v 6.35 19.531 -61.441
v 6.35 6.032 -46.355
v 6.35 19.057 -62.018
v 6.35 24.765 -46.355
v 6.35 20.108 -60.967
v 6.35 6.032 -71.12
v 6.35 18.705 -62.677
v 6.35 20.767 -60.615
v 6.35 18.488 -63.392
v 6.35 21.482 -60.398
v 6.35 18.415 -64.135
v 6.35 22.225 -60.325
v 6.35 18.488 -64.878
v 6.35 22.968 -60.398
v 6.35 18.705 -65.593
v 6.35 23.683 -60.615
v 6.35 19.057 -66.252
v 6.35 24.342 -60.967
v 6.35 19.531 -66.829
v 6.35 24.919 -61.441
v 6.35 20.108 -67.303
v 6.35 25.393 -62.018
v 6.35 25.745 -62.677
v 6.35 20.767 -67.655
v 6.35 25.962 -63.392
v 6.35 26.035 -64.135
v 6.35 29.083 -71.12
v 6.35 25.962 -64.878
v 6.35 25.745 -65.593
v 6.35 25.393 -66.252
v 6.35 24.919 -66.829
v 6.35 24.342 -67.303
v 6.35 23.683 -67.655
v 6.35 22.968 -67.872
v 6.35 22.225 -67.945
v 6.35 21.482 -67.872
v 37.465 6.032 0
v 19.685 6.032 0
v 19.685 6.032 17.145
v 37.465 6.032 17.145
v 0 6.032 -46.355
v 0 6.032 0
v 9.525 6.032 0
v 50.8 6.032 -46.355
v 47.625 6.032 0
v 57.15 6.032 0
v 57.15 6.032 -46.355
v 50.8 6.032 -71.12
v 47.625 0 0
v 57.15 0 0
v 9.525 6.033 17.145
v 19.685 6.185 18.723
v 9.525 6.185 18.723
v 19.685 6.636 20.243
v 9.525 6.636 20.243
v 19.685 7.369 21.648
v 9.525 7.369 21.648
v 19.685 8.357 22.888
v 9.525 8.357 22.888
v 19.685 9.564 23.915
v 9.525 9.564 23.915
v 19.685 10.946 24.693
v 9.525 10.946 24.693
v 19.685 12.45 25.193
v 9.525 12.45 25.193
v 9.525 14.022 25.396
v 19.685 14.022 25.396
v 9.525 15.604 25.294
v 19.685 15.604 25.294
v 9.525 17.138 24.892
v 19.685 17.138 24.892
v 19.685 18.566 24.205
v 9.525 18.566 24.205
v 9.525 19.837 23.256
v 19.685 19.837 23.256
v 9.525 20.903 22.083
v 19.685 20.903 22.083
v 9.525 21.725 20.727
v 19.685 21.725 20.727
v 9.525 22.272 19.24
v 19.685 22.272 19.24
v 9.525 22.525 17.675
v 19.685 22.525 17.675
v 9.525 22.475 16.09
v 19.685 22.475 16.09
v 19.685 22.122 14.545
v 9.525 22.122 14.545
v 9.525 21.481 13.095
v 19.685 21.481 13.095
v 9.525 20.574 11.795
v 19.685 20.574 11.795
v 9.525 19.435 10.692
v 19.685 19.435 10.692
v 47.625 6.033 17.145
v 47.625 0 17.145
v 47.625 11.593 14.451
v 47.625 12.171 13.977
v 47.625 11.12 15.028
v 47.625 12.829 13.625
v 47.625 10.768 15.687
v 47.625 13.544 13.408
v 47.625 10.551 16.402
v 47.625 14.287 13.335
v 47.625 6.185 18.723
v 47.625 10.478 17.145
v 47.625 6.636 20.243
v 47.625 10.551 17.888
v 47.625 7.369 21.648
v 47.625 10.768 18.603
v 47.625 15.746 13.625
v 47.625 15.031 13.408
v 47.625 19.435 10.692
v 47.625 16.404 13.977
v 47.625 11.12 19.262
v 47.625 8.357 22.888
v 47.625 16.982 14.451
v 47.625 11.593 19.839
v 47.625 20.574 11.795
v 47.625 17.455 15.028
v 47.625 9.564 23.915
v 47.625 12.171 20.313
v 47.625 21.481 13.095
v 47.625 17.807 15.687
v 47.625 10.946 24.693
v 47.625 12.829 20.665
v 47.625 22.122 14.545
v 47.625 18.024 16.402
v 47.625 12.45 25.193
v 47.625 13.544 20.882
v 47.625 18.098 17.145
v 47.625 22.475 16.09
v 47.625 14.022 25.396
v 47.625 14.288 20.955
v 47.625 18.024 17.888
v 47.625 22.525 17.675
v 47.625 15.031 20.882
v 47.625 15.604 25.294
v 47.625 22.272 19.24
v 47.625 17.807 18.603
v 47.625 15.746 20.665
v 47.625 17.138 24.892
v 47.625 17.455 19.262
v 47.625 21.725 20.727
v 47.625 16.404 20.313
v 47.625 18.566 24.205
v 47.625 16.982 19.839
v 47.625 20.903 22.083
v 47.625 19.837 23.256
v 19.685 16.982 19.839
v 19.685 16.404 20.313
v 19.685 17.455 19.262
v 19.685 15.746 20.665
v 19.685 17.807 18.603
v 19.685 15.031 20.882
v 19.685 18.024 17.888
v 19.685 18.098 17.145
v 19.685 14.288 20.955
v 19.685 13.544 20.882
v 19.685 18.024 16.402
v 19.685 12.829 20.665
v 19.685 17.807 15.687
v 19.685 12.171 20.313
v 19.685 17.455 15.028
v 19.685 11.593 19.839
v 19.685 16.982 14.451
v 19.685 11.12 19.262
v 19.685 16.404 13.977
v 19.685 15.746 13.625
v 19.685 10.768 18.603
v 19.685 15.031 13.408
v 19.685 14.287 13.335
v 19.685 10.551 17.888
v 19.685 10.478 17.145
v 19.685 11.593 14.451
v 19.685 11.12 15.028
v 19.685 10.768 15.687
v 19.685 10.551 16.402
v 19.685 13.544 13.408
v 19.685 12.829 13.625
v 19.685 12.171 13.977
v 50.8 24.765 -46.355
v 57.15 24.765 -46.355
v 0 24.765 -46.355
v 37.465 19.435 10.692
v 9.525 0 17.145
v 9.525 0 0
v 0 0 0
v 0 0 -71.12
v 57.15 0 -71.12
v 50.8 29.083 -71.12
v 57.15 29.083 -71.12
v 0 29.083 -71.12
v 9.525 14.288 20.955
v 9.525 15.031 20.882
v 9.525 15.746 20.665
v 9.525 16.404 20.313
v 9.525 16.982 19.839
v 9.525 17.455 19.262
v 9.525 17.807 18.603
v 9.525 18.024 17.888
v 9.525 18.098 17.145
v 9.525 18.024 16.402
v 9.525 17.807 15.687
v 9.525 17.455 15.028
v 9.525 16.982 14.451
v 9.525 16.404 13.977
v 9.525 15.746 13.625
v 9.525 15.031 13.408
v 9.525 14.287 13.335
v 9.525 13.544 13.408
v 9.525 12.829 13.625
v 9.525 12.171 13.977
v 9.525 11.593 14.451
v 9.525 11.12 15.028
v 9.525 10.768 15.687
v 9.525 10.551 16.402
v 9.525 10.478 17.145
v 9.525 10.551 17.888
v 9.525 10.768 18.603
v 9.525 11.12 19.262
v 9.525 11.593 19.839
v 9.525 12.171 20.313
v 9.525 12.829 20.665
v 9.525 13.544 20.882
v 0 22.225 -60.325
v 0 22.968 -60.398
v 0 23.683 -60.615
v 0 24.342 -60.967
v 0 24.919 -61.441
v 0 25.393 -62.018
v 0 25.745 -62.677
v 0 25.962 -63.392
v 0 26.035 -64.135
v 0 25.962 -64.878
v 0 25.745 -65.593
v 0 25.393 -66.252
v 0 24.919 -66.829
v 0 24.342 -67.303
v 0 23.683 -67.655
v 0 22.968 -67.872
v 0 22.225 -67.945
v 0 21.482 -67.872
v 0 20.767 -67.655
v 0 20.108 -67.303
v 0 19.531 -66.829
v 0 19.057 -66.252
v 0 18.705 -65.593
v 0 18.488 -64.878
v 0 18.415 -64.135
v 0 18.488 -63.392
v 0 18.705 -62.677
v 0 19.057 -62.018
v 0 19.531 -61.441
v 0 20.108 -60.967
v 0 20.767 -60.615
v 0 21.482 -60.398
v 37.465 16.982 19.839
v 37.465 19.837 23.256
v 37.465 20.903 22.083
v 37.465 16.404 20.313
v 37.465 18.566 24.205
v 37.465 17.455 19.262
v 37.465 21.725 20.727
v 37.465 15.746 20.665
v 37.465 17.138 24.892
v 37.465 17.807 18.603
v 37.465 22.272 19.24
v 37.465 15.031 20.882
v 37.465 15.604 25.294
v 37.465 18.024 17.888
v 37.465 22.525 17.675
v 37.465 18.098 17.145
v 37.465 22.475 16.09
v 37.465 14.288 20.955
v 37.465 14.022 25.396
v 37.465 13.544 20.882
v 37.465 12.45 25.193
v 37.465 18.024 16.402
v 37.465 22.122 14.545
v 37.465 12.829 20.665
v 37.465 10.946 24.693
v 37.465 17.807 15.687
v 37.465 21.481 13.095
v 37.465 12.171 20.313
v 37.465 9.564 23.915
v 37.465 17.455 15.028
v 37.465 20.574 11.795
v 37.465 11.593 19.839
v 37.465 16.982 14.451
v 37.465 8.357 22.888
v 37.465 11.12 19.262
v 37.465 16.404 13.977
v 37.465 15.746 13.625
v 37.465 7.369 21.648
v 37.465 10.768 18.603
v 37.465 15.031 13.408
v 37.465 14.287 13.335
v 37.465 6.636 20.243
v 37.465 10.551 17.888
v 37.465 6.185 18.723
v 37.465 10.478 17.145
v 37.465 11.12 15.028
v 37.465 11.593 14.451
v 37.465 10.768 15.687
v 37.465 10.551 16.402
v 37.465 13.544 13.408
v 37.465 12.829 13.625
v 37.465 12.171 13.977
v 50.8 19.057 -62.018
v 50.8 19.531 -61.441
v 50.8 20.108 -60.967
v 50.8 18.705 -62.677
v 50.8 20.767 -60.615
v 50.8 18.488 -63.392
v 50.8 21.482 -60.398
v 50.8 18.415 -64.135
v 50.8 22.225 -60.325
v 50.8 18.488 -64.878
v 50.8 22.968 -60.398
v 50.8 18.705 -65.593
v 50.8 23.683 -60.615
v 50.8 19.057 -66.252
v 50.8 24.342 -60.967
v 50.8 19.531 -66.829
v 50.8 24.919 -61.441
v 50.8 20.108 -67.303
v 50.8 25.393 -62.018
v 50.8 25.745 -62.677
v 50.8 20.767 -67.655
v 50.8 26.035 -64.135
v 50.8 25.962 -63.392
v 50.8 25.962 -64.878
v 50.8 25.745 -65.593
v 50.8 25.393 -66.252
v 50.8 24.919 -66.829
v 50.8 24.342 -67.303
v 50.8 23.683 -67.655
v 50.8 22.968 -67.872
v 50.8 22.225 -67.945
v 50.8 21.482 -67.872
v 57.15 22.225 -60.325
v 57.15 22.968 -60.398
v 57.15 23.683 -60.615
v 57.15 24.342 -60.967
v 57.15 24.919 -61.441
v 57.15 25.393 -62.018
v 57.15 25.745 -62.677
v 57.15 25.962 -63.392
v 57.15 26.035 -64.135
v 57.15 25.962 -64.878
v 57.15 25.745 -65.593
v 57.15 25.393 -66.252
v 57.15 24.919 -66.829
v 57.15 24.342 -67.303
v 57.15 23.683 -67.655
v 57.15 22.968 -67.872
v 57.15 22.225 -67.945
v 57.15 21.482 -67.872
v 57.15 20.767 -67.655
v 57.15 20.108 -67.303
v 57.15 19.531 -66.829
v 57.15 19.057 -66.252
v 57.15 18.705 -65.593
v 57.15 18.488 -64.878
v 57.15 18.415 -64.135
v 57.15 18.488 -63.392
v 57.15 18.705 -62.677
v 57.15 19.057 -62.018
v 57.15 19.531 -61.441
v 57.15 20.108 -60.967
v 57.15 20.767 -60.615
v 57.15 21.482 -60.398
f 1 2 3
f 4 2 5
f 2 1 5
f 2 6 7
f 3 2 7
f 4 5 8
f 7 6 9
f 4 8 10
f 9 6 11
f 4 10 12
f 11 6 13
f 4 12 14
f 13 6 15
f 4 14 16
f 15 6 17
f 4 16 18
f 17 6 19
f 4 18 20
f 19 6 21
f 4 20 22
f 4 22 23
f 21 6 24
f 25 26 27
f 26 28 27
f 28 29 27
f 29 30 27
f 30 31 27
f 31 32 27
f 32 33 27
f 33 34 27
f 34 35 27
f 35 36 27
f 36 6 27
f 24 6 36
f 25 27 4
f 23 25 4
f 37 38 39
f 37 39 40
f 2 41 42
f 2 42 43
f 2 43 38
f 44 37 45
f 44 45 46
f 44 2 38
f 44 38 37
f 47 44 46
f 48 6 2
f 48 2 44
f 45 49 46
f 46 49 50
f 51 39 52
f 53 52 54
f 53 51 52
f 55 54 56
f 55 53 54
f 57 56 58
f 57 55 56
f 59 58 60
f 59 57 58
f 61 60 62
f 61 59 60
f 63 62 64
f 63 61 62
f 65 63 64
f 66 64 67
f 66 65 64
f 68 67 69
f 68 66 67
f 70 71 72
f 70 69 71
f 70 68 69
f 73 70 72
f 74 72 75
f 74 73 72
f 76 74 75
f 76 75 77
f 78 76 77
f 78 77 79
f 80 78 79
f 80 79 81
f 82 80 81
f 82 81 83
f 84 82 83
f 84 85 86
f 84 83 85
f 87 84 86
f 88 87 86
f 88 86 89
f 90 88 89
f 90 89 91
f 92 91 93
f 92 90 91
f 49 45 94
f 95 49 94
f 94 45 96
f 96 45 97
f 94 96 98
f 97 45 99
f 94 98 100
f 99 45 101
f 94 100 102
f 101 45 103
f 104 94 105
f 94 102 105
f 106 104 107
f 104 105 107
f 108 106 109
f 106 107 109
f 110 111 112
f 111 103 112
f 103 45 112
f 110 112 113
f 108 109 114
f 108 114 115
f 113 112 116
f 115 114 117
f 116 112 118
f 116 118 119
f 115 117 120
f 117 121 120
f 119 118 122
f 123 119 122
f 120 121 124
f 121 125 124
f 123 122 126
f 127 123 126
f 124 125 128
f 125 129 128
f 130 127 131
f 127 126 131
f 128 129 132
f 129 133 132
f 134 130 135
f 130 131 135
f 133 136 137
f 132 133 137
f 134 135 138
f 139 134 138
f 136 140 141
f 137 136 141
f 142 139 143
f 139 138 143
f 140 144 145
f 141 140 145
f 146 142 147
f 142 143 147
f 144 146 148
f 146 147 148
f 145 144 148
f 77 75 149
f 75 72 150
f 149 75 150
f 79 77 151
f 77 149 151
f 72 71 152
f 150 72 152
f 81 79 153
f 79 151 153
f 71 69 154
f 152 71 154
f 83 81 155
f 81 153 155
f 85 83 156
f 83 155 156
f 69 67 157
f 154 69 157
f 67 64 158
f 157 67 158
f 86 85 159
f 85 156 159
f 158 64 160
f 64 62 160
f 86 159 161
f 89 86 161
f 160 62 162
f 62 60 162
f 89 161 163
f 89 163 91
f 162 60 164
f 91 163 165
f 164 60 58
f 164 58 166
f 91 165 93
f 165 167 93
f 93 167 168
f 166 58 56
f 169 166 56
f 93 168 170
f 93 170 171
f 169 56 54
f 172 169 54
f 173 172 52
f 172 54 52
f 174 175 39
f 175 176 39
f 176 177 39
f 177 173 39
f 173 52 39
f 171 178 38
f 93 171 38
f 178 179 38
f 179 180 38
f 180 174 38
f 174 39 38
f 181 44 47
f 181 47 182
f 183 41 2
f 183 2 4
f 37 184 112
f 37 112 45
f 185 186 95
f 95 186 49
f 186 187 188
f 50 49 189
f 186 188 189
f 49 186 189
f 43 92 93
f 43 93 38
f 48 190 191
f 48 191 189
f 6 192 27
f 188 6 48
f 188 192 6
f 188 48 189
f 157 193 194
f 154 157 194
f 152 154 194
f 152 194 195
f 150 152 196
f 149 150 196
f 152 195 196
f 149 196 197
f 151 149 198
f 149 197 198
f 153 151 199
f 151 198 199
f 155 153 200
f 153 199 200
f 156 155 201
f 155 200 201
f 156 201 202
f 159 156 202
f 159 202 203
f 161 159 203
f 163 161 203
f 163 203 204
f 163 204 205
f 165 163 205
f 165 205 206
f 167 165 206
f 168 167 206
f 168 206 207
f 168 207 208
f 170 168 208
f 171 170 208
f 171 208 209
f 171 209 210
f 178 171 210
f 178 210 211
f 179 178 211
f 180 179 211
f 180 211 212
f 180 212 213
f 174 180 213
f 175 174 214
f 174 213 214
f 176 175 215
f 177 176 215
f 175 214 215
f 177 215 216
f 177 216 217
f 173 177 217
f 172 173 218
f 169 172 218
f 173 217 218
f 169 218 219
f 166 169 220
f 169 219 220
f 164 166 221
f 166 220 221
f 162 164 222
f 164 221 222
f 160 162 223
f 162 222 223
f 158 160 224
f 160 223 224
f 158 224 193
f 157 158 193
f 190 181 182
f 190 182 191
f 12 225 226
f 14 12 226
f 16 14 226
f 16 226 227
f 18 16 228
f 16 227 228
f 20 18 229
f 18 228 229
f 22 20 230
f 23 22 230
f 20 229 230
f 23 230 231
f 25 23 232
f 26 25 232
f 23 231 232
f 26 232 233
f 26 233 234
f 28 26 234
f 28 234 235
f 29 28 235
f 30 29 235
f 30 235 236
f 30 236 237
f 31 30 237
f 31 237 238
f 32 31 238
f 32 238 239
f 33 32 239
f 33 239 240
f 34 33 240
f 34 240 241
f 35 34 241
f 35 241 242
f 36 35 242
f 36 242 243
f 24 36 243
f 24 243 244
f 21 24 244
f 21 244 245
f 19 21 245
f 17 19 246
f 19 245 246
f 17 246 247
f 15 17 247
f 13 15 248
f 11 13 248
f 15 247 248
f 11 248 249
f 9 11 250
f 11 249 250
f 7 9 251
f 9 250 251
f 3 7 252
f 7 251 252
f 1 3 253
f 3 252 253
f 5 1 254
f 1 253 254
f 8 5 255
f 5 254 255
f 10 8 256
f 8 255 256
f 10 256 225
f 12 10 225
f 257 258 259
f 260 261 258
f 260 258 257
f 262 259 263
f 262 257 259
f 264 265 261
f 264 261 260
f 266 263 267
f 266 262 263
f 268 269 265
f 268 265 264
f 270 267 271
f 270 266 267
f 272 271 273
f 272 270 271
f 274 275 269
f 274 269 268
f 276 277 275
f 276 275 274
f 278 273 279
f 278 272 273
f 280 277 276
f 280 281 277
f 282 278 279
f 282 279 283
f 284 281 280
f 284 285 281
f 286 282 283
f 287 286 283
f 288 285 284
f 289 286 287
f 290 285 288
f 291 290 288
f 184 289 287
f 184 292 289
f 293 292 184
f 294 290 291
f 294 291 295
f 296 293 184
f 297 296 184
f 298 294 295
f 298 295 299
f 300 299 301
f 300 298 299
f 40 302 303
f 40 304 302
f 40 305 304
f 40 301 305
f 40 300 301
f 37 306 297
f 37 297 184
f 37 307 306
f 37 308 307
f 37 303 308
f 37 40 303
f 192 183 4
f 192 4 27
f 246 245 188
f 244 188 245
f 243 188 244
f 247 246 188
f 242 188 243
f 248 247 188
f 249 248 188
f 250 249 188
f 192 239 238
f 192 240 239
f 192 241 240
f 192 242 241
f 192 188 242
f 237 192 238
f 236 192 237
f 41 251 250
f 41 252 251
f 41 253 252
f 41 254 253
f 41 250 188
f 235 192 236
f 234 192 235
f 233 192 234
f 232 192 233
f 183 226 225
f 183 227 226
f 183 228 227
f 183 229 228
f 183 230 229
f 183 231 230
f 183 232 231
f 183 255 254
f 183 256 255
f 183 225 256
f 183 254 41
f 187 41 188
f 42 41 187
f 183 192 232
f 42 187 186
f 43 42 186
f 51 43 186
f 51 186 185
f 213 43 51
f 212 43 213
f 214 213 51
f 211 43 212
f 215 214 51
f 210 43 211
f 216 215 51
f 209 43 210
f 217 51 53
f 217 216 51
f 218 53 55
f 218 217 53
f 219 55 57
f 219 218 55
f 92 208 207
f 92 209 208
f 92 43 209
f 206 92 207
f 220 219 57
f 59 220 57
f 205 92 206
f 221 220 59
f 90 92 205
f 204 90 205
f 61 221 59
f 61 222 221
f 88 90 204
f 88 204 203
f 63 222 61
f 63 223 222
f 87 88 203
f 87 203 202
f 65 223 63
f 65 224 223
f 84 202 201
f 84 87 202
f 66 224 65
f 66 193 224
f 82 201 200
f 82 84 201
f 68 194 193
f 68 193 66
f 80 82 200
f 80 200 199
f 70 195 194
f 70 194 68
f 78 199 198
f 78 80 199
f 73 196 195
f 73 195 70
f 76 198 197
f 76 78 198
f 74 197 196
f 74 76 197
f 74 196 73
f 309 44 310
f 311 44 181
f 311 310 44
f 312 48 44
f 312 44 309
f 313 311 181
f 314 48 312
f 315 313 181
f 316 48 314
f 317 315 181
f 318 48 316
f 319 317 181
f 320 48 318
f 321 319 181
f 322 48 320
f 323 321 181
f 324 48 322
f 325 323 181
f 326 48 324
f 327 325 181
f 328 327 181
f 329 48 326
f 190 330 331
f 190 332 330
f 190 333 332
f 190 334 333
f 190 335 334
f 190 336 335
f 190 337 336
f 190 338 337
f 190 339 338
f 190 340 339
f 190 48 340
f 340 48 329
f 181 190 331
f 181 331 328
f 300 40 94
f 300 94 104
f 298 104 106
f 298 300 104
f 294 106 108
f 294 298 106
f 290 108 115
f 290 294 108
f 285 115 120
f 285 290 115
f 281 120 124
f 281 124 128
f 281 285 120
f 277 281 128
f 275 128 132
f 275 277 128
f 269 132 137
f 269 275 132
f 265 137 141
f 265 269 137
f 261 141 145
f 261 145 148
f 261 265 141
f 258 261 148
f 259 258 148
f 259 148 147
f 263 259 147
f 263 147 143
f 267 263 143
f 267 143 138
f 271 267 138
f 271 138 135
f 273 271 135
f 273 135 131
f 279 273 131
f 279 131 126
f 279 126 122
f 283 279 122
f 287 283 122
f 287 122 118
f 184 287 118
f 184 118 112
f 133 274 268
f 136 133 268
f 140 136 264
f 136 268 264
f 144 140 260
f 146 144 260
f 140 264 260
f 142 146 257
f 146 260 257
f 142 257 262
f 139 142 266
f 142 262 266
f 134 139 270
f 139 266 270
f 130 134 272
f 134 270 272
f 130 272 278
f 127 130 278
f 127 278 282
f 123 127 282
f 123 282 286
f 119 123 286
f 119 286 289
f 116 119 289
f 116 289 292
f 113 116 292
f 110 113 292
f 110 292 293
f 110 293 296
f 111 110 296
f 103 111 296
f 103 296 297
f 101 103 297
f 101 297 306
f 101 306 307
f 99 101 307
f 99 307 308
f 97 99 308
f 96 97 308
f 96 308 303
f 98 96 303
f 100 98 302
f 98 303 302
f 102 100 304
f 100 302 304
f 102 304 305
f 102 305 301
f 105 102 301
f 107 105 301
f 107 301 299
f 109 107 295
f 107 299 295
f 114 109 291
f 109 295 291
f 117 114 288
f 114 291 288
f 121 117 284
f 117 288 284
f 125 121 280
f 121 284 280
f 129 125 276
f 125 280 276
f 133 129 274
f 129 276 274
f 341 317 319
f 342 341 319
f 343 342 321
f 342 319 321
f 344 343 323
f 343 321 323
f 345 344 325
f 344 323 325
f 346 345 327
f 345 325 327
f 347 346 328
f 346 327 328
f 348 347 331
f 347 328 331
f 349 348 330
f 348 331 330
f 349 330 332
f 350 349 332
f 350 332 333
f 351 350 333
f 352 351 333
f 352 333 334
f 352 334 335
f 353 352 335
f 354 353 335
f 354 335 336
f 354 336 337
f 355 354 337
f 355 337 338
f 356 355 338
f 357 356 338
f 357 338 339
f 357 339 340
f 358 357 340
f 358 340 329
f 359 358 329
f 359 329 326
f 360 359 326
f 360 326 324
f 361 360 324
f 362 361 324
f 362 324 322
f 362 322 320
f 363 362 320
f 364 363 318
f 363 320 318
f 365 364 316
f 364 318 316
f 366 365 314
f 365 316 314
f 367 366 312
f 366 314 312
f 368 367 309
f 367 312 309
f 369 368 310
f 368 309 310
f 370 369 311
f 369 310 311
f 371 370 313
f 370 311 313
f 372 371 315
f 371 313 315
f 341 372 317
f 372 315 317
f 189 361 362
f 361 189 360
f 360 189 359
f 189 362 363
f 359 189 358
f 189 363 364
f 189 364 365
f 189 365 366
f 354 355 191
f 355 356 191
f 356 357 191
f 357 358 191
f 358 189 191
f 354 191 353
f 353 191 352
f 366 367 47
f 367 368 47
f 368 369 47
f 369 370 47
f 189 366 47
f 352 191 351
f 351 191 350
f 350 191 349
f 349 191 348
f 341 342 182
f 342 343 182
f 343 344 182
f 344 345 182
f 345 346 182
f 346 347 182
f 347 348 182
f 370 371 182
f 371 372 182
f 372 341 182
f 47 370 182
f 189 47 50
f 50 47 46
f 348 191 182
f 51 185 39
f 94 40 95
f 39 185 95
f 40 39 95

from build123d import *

# Parameters (mm, degrees)
SKETCH1_W           = 57.15
SKETCH1_H           = 71.12
SKETCH1_W_2         = 38.1
SKETCH1_H_2         = 17.145
BOSS_EXTRUDE1_DEPTH = 6.0325
SKETCH2_R           = 8.255
SKETCH2_R_2         = 3.81
BOSS_EXTRUDE2_DEPTH = 38.1
SKETCH3_W           = 17.78
SKETCH3_H           = 25.4
CUT_EXTRUDE1_DEPTH  = 35.7505
SKETCH4_R           = 3.81
BOSS_EXTRUDE3_DEPTH = 57.15
SKETCH5_W           = 44.45
SKETCH5_H           = 23.0505
CUT_EXTRUDE2_DEPTH  = 35.7505


with BuildPart() as part:
    # Sketch1 → Boss-Extrude1 (new body)
    with BuildSketch(Plane(origin=(0, 0, 0), x_dir=(1, 0, 0), z_dir=(0, 1, 0))):
        with Locations((28.575, 35.56)):
            Rectangle(SKETCH1_W, SKETCH1_H)
        with Locations((28.575, -8.5725)):
            Rectangle(SKETCH1_W_2, SKETCH1_H_2)
    extrude(amount=BOSS_EXTRUDE1_DEPTH)

    # Sketch2 → Boss-Extrude2 (add)
    with BuildSketch(Plane.ZY.offset(-9.525)):
        with BuildLine():
            Line((10.691759465, 19.435384187), (0, 6.0325))
            Line((0, 6.0325), (17.145, 6.0325))
            ThreePointArc((17.145, 6.0325), (9.707231216, 10.706352067), (10.691759465, 19.435384187))
        make_face()
        with Locations((17.145, 14.2875)):
            Circle(SKETCH2_R)
        with Locations((17.145, 14.2875)):
            Circle(SKETCH2_R_2, mode=Mode.SUBTRACT)
    extrude(amount=-BOSS_EXTRUDE2_DEPTH)

    # Sketch3 → Cut-Extrude1 (cut)
    with BuildSketch(Plane(origin=(0, 6.0325, 0), x_dir=(1, 0, 0), z_dir=(0, 1, 0))):
        with Locations((28.575, -12.7)):
            Rectangle(SKETCH3_W, SKETCH3_H)
    extrude(amount=CUT_EXTRUDE1_DEPTH, mode=Mode.SUBTRACT)

    # Sketch4 → Boss-Extrude3 (add)
    with BuildSketch(Plane.ZY):
        Polygon((-46.355, 6.0325), (-46.355, 24.765), (-71.12, 29.083), (-71.12, 6.0325), align=None)
        with Locations((-64.135, 22.225)):
            Circle(SKETCH4_R, mode=Mode.SUBTRACT)
    extrude(amount=-BOSS_EXTRUDE3_DEPTH)

    # Sketch5 → Cut-Extrude2 (cut)
    with BuildSketch(Plane(origin=(0, 0, -71.12), x_dir=(-1, 0, 0), z_dir=(0, 0, -1))):
        with Locations((-28.575, 17.55775)):
            Rectangle(SKETCH5_W, SKETCH5_H)
    extrude(amount=-CUT_EXTRUDE2_DEPTH, mode=Mode.SUBTRACT)


solid = part.part
